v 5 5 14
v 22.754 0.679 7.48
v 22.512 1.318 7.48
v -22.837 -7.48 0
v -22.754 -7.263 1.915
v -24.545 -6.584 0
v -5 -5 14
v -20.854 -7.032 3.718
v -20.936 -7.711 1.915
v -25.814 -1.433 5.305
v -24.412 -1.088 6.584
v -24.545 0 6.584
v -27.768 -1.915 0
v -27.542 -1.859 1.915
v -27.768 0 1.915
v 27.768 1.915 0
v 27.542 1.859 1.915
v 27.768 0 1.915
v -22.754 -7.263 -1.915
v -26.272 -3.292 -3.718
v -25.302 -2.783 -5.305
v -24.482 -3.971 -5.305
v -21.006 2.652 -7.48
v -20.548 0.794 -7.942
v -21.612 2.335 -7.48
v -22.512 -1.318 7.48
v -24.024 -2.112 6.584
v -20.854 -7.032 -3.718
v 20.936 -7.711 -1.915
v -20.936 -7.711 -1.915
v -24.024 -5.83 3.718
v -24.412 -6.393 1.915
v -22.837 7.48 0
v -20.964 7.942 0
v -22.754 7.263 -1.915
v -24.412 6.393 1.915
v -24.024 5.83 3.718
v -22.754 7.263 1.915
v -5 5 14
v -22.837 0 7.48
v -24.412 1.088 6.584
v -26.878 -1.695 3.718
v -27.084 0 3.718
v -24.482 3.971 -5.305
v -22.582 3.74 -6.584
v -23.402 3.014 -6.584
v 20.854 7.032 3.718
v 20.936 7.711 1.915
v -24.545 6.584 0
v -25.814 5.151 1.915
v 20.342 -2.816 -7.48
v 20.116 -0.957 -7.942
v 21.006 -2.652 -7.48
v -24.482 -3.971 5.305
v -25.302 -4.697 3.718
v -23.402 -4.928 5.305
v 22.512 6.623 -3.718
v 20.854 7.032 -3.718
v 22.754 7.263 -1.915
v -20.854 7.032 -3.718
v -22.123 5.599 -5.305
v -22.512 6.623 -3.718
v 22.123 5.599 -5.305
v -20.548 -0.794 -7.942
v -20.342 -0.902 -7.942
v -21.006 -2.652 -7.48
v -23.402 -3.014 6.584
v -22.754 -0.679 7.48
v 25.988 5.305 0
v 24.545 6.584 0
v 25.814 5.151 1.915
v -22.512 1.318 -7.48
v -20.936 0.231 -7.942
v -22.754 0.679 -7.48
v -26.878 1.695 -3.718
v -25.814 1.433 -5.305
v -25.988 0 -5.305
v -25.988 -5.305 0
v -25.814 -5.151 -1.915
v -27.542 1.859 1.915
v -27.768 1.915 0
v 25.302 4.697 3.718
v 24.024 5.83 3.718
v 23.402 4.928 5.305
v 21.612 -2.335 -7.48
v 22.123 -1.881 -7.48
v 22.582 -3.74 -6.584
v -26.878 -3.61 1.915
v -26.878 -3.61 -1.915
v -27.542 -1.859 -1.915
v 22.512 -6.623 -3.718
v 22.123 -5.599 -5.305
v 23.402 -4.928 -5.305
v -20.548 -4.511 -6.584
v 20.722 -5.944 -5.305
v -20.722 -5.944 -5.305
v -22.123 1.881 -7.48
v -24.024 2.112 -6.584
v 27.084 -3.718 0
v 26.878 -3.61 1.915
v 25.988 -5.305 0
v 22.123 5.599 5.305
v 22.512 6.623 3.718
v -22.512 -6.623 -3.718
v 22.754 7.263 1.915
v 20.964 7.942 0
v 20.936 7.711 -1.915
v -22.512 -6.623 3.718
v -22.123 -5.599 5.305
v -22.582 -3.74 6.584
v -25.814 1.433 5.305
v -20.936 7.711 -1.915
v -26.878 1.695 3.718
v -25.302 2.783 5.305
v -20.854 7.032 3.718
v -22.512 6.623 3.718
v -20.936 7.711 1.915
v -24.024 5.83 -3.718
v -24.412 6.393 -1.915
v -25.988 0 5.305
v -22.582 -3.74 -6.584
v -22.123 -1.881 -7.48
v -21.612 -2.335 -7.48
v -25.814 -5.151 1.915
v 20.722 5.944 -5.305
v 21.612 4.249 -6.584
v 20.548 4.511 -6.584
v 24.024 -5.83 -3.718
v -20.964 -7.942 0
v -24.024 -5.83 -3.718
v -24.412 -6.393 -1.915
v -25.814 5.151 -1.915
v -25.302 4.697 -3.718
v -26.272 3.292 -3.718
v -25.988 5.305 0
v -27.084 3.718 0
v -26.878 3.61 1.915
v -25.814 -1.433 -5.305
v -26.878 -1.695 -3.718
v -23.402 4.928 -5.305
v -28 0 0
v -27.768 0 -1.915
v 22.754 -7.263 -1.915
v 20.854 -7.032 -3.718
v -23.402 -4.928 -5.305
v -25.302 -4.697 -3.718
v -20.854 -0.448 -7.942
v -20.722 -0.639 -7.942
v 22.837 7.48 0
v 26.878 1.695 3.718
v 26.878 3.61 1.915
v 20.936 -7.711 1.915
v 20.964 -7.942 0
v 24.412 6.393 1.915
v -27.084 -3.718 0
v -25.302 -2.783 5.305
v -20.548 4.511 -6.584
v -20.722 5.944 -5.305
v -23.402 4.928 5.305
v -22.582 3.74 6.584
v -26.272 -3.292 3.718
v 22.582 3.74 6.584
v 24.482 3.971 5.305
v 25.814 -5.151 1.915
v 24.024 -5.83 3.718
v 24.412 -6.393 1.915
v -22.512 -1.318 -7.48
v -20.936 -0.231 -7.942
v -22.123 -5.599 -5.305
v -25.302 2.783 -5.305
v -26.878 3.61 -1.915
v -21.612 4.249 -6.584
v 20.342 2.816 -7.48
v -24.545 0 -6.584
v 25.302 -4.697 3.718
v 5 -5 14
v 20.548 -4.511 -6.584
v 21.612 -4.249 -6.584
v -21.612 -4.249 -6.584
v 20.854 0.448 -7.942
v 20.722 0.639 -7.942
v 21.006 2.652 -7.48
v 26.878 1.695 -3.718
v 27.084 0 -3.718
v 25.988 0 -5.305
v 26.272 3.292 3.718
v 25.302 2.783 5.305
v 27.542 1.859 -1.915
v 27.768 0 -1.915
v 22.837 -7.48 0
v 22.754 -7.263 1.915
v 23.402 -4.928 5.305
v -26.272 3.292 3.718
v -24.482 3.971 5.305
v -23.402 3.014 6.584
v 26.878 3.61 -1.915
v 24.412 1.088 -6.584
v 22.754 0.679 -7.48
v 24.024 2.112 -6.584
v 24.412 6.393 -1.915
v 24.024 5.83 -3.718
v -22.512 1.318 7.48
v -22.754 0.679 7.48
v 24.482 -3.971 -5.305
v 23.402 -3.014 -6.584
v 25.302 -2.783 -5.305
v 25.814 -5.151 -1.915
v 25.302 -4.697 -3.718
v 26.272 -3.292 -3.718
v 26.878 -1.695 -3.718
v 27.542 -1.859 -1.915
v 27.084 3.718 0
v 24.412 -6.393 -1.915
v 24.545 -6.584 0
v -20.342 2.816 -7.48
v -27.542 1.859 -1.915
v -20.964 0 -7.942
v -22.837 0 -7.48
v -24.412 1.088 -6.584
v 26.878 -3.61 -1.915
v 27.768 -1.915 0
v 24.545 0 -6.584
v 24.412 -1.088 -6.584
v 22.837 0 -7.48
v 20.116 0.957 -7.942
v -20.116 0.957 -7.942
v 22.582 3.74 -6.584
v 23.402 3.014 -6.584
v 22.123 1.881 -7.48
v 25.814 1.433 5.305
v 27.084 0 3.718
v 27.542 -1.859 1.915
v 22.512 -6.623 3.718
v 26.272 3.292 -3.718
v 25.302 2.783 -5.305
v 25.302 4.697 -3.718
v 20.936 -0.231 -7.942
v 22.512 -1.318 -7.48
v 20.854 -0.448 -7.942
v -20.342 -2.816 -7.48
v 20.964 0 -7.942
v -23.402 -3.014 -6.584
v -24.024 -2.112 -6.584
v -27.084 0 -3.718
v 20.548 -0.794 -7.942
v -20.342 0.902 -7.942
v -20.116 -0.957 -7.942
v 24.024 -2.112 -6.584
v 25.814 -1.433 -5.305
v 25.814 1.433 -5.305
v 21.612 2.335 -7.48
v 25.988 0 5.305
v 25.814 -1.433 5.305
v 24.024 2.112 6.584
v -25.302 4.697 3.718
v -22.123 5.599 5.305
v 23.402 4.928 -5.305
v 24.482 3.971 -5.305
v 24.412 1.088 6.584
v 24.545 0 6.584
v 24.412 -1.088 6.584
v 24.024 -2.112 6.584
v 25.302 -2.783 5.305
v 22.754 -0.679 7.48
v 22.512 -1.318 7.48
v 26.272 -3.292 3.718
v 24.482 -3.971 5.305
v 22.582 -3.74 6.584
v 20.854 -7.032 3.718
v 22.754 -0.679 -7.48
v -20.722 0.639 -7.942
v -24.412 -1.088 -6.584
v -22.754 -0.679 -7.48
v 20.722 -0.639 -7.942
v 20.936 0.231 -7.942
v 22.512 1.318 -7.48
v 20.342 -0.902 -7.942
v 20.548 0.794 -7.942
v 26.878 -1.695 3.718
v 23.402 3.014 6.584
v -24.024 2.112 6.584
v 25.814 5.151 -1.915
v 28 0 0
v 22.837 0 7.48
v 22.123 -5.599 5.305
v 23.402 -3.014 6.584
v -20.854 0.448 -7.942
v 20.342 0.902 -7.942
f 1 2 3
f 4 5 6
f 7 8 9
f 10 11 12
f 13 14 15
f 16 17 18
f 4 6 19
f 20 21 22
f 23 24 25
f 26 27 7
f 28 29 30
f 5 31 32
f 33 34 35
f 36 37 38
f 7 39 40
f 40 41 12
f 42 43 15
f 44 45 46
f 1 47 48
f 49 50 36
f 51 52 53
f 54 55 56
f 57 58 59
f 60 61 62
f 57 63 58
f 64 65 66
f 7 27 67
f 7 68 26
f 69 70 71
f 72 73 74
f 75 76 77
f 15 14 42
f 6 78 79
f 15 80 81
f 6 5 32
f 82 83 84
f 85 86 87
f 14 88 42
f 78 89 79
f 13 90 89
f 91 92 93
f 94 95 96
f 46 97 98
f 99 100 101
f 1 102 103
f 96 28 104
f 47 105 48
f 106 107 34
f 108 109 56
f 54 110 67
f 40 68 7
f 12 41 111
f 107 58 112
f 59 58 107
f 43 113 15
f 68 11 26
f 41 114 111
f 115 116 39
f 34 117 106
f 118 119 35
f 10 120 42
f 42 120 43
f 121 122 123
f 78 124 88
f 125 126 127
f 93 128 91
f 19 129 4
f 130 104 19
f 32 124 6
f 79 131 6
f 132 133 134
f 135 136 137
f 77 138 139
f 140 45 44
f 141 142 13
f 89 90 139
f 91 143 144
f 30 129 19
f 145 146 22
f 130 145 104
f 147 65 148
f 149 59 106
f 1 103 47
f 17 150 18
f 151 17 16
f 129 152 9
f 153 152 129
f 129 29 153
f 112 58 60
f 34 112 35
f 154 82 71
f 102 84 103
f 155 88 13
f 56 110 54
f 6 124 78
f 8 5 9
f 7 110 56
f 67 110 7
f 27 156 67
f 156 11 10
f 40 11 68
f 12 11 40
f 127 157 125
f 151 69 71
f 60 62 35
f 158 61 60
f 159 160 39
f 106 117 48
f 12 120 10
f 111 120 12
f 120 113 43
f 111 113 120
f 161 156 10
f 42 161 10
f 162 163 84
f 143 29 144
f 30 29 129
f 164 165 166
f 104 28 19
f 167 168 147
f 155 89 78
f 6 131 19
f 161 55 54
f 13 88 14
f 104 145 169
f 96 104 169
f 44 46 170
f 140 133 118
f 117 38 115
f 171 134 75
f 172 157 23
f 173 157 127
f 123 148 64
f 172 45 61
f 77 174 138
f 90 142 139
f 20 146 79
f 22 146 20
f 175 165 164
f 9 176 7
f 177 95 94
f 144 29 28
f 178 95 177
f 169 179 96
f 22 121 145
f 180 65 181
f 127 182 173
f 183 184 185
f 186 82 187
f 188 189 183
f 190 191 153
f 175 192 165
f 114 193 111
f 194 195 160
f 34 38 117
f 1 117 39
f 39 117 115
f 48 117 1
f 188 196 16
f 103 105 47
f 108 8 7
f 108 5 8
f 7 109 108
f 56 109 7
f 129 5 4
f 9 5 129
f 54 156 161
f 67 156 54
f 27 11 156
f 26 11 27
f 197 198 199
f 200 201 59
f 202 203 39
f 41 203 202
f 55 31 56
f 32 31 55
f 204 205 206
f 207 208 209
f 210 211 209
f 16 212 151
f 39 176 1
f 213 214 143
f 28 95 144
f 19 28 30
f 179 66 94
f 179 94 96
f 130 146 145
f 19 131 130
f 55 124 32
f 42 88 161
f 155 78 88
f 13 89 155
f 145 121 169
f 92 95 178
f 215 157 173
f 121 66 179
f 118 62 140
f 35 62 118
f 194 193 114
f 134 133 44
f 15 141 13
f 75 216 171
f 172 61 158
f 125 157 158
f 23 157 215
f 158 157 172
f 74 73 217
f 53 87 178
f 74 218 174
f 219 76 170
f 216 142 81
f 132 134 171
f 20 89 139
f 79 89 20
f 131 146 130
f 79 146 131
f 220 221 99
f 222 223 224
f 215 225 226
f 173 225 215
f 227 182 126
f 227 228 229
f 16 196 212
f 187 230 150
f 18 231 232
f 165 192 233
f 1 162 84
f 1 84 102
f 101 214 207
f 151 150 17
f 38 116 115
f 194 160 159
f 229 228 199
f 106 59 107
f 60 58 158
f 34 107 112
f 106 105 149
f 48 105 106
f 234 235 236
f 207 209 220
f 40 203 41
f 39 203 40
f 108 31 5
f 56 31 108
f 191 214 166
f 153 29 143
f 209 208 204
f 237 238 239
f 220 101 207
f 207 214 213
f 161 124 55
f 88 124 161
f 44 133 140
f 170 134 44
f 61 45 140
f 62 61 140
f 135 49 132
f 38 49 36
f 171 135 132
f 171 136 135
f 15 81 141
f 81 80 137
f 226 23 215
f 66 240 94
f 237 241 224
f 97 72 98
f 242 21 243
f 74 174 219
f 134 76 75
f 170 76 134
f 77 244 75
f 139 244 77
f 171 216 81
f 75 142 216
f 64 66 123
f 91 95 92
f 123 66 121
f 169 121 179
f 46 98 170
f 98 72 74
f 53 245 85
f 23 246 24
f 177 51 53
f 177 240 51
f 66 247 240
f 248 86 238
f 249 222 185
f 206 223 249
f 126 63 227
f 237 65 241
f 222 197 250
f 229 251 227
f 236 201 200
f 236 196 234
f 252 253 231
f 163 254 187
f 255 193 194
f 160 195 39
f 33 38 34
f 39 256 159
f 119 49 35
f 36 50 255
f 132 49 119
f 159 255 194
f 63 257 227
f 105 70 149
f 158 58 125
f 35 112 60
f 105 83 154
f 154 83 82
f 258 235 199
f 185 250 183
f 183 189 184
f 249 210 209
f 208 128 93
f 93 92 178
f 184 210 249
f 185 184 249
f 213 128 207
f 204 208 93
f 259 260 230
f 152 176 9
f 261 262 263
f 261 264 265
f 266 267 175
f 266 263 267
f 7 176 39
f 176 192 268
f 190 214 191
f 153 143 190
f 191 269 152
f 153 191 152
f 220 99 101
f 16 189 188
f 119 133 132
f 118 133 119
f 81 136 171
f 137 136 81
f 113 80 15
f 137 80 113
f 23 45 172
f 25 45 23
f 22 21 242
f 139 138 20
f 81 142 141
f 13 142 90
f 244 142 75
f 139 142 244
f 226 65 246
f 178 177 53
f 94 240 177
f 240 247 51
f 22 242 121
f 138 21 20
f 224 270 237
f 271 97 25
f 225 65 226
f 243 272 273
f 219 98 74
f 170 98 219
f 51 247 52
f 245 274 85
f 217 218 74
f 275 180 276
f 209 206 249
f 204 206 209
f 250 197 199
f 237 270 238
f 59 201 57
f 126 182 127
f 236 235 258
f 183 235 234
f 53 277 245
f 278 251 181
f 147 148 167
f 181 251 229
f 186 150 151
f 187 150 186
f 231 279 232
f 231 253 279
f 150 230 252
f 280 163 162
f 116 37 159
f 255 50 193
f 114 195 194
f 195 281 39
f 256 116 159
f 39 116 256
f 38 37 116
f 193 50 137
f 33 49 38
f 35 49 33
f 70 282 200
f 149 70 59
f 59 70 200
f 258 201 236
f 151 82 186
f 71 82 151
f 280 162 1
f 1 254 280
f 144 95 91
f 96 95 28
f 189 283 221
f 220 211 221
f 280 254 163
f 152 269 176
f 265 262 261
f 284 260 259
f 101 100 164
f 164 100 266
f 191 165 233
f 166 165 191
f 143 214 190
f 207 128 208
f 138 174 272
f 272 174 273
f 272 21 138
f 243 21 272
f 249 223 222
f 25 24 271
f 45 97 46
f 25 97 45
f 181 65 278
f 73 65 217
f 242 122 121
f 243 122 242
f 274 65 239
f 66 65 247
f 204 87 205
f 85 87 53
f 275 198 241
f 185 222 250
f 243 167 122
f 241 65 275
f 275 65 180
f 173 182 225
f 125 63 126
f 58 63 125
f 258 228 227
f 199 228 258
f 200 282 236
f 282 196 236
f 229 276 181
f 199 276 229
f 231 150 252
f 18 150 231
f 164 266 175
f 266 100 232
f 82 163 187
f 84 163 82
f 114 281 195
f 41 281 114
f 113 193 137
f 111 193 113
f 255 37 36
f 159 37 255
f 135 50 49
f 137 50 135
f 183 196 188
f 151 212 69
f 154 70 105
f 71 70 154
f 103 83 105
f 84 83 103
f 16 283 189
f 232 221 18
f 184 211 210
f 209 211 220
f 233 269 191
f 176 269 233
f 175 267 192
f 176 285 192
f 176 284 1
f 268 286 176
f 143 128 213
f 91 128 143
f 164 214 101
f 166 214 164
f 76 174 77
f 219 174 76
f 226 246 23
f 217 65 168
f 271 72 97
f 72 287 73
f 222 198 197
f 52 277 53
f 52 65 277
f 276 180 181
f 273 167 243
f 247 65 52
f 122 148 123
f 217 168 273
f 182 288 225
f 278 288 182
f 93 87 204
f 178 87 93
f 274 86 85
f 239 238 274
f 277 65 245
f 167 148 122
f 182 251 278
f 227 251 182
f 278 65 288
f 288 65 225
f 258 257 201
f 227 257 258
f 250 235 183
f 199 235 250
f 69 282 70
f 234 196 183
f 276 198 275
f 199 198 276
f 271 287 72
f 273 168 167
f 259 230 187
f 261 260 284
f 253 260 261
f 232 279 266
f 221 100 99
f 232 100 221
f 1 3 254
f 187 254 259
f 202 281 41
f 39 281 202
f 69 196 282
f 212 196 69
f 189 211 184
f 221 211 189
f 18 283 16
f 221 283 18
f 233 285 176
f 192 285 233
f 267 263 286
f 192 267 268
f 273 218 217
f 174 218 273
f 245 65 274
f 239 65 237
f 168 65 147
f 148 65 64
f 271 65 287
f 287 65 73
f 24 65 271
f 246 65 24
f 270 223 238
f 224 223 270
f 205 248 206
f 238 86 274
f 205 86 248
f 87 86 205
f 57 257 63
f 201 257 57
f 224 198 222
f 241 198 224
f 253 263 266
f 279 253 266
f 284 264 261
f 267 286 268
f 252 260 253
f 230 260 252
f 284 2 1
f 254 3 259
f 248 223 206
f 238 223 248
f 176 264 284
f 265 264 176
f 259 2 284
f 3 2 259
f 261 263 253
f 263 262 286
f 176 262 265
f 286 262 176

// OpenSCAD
// Showcase 3: Rounded Barbell Bracket
hull() {
  // Left pivot anchor
  translate([-20, 0, 0])
    sphere(r=8);

  // Right pivot anchor
  translate([20, 0, 0])
    sphere(r=8);

  // Top structural riser
  translate([0, 0, 12])
    cube([10, 10, 4], center=true);
}
